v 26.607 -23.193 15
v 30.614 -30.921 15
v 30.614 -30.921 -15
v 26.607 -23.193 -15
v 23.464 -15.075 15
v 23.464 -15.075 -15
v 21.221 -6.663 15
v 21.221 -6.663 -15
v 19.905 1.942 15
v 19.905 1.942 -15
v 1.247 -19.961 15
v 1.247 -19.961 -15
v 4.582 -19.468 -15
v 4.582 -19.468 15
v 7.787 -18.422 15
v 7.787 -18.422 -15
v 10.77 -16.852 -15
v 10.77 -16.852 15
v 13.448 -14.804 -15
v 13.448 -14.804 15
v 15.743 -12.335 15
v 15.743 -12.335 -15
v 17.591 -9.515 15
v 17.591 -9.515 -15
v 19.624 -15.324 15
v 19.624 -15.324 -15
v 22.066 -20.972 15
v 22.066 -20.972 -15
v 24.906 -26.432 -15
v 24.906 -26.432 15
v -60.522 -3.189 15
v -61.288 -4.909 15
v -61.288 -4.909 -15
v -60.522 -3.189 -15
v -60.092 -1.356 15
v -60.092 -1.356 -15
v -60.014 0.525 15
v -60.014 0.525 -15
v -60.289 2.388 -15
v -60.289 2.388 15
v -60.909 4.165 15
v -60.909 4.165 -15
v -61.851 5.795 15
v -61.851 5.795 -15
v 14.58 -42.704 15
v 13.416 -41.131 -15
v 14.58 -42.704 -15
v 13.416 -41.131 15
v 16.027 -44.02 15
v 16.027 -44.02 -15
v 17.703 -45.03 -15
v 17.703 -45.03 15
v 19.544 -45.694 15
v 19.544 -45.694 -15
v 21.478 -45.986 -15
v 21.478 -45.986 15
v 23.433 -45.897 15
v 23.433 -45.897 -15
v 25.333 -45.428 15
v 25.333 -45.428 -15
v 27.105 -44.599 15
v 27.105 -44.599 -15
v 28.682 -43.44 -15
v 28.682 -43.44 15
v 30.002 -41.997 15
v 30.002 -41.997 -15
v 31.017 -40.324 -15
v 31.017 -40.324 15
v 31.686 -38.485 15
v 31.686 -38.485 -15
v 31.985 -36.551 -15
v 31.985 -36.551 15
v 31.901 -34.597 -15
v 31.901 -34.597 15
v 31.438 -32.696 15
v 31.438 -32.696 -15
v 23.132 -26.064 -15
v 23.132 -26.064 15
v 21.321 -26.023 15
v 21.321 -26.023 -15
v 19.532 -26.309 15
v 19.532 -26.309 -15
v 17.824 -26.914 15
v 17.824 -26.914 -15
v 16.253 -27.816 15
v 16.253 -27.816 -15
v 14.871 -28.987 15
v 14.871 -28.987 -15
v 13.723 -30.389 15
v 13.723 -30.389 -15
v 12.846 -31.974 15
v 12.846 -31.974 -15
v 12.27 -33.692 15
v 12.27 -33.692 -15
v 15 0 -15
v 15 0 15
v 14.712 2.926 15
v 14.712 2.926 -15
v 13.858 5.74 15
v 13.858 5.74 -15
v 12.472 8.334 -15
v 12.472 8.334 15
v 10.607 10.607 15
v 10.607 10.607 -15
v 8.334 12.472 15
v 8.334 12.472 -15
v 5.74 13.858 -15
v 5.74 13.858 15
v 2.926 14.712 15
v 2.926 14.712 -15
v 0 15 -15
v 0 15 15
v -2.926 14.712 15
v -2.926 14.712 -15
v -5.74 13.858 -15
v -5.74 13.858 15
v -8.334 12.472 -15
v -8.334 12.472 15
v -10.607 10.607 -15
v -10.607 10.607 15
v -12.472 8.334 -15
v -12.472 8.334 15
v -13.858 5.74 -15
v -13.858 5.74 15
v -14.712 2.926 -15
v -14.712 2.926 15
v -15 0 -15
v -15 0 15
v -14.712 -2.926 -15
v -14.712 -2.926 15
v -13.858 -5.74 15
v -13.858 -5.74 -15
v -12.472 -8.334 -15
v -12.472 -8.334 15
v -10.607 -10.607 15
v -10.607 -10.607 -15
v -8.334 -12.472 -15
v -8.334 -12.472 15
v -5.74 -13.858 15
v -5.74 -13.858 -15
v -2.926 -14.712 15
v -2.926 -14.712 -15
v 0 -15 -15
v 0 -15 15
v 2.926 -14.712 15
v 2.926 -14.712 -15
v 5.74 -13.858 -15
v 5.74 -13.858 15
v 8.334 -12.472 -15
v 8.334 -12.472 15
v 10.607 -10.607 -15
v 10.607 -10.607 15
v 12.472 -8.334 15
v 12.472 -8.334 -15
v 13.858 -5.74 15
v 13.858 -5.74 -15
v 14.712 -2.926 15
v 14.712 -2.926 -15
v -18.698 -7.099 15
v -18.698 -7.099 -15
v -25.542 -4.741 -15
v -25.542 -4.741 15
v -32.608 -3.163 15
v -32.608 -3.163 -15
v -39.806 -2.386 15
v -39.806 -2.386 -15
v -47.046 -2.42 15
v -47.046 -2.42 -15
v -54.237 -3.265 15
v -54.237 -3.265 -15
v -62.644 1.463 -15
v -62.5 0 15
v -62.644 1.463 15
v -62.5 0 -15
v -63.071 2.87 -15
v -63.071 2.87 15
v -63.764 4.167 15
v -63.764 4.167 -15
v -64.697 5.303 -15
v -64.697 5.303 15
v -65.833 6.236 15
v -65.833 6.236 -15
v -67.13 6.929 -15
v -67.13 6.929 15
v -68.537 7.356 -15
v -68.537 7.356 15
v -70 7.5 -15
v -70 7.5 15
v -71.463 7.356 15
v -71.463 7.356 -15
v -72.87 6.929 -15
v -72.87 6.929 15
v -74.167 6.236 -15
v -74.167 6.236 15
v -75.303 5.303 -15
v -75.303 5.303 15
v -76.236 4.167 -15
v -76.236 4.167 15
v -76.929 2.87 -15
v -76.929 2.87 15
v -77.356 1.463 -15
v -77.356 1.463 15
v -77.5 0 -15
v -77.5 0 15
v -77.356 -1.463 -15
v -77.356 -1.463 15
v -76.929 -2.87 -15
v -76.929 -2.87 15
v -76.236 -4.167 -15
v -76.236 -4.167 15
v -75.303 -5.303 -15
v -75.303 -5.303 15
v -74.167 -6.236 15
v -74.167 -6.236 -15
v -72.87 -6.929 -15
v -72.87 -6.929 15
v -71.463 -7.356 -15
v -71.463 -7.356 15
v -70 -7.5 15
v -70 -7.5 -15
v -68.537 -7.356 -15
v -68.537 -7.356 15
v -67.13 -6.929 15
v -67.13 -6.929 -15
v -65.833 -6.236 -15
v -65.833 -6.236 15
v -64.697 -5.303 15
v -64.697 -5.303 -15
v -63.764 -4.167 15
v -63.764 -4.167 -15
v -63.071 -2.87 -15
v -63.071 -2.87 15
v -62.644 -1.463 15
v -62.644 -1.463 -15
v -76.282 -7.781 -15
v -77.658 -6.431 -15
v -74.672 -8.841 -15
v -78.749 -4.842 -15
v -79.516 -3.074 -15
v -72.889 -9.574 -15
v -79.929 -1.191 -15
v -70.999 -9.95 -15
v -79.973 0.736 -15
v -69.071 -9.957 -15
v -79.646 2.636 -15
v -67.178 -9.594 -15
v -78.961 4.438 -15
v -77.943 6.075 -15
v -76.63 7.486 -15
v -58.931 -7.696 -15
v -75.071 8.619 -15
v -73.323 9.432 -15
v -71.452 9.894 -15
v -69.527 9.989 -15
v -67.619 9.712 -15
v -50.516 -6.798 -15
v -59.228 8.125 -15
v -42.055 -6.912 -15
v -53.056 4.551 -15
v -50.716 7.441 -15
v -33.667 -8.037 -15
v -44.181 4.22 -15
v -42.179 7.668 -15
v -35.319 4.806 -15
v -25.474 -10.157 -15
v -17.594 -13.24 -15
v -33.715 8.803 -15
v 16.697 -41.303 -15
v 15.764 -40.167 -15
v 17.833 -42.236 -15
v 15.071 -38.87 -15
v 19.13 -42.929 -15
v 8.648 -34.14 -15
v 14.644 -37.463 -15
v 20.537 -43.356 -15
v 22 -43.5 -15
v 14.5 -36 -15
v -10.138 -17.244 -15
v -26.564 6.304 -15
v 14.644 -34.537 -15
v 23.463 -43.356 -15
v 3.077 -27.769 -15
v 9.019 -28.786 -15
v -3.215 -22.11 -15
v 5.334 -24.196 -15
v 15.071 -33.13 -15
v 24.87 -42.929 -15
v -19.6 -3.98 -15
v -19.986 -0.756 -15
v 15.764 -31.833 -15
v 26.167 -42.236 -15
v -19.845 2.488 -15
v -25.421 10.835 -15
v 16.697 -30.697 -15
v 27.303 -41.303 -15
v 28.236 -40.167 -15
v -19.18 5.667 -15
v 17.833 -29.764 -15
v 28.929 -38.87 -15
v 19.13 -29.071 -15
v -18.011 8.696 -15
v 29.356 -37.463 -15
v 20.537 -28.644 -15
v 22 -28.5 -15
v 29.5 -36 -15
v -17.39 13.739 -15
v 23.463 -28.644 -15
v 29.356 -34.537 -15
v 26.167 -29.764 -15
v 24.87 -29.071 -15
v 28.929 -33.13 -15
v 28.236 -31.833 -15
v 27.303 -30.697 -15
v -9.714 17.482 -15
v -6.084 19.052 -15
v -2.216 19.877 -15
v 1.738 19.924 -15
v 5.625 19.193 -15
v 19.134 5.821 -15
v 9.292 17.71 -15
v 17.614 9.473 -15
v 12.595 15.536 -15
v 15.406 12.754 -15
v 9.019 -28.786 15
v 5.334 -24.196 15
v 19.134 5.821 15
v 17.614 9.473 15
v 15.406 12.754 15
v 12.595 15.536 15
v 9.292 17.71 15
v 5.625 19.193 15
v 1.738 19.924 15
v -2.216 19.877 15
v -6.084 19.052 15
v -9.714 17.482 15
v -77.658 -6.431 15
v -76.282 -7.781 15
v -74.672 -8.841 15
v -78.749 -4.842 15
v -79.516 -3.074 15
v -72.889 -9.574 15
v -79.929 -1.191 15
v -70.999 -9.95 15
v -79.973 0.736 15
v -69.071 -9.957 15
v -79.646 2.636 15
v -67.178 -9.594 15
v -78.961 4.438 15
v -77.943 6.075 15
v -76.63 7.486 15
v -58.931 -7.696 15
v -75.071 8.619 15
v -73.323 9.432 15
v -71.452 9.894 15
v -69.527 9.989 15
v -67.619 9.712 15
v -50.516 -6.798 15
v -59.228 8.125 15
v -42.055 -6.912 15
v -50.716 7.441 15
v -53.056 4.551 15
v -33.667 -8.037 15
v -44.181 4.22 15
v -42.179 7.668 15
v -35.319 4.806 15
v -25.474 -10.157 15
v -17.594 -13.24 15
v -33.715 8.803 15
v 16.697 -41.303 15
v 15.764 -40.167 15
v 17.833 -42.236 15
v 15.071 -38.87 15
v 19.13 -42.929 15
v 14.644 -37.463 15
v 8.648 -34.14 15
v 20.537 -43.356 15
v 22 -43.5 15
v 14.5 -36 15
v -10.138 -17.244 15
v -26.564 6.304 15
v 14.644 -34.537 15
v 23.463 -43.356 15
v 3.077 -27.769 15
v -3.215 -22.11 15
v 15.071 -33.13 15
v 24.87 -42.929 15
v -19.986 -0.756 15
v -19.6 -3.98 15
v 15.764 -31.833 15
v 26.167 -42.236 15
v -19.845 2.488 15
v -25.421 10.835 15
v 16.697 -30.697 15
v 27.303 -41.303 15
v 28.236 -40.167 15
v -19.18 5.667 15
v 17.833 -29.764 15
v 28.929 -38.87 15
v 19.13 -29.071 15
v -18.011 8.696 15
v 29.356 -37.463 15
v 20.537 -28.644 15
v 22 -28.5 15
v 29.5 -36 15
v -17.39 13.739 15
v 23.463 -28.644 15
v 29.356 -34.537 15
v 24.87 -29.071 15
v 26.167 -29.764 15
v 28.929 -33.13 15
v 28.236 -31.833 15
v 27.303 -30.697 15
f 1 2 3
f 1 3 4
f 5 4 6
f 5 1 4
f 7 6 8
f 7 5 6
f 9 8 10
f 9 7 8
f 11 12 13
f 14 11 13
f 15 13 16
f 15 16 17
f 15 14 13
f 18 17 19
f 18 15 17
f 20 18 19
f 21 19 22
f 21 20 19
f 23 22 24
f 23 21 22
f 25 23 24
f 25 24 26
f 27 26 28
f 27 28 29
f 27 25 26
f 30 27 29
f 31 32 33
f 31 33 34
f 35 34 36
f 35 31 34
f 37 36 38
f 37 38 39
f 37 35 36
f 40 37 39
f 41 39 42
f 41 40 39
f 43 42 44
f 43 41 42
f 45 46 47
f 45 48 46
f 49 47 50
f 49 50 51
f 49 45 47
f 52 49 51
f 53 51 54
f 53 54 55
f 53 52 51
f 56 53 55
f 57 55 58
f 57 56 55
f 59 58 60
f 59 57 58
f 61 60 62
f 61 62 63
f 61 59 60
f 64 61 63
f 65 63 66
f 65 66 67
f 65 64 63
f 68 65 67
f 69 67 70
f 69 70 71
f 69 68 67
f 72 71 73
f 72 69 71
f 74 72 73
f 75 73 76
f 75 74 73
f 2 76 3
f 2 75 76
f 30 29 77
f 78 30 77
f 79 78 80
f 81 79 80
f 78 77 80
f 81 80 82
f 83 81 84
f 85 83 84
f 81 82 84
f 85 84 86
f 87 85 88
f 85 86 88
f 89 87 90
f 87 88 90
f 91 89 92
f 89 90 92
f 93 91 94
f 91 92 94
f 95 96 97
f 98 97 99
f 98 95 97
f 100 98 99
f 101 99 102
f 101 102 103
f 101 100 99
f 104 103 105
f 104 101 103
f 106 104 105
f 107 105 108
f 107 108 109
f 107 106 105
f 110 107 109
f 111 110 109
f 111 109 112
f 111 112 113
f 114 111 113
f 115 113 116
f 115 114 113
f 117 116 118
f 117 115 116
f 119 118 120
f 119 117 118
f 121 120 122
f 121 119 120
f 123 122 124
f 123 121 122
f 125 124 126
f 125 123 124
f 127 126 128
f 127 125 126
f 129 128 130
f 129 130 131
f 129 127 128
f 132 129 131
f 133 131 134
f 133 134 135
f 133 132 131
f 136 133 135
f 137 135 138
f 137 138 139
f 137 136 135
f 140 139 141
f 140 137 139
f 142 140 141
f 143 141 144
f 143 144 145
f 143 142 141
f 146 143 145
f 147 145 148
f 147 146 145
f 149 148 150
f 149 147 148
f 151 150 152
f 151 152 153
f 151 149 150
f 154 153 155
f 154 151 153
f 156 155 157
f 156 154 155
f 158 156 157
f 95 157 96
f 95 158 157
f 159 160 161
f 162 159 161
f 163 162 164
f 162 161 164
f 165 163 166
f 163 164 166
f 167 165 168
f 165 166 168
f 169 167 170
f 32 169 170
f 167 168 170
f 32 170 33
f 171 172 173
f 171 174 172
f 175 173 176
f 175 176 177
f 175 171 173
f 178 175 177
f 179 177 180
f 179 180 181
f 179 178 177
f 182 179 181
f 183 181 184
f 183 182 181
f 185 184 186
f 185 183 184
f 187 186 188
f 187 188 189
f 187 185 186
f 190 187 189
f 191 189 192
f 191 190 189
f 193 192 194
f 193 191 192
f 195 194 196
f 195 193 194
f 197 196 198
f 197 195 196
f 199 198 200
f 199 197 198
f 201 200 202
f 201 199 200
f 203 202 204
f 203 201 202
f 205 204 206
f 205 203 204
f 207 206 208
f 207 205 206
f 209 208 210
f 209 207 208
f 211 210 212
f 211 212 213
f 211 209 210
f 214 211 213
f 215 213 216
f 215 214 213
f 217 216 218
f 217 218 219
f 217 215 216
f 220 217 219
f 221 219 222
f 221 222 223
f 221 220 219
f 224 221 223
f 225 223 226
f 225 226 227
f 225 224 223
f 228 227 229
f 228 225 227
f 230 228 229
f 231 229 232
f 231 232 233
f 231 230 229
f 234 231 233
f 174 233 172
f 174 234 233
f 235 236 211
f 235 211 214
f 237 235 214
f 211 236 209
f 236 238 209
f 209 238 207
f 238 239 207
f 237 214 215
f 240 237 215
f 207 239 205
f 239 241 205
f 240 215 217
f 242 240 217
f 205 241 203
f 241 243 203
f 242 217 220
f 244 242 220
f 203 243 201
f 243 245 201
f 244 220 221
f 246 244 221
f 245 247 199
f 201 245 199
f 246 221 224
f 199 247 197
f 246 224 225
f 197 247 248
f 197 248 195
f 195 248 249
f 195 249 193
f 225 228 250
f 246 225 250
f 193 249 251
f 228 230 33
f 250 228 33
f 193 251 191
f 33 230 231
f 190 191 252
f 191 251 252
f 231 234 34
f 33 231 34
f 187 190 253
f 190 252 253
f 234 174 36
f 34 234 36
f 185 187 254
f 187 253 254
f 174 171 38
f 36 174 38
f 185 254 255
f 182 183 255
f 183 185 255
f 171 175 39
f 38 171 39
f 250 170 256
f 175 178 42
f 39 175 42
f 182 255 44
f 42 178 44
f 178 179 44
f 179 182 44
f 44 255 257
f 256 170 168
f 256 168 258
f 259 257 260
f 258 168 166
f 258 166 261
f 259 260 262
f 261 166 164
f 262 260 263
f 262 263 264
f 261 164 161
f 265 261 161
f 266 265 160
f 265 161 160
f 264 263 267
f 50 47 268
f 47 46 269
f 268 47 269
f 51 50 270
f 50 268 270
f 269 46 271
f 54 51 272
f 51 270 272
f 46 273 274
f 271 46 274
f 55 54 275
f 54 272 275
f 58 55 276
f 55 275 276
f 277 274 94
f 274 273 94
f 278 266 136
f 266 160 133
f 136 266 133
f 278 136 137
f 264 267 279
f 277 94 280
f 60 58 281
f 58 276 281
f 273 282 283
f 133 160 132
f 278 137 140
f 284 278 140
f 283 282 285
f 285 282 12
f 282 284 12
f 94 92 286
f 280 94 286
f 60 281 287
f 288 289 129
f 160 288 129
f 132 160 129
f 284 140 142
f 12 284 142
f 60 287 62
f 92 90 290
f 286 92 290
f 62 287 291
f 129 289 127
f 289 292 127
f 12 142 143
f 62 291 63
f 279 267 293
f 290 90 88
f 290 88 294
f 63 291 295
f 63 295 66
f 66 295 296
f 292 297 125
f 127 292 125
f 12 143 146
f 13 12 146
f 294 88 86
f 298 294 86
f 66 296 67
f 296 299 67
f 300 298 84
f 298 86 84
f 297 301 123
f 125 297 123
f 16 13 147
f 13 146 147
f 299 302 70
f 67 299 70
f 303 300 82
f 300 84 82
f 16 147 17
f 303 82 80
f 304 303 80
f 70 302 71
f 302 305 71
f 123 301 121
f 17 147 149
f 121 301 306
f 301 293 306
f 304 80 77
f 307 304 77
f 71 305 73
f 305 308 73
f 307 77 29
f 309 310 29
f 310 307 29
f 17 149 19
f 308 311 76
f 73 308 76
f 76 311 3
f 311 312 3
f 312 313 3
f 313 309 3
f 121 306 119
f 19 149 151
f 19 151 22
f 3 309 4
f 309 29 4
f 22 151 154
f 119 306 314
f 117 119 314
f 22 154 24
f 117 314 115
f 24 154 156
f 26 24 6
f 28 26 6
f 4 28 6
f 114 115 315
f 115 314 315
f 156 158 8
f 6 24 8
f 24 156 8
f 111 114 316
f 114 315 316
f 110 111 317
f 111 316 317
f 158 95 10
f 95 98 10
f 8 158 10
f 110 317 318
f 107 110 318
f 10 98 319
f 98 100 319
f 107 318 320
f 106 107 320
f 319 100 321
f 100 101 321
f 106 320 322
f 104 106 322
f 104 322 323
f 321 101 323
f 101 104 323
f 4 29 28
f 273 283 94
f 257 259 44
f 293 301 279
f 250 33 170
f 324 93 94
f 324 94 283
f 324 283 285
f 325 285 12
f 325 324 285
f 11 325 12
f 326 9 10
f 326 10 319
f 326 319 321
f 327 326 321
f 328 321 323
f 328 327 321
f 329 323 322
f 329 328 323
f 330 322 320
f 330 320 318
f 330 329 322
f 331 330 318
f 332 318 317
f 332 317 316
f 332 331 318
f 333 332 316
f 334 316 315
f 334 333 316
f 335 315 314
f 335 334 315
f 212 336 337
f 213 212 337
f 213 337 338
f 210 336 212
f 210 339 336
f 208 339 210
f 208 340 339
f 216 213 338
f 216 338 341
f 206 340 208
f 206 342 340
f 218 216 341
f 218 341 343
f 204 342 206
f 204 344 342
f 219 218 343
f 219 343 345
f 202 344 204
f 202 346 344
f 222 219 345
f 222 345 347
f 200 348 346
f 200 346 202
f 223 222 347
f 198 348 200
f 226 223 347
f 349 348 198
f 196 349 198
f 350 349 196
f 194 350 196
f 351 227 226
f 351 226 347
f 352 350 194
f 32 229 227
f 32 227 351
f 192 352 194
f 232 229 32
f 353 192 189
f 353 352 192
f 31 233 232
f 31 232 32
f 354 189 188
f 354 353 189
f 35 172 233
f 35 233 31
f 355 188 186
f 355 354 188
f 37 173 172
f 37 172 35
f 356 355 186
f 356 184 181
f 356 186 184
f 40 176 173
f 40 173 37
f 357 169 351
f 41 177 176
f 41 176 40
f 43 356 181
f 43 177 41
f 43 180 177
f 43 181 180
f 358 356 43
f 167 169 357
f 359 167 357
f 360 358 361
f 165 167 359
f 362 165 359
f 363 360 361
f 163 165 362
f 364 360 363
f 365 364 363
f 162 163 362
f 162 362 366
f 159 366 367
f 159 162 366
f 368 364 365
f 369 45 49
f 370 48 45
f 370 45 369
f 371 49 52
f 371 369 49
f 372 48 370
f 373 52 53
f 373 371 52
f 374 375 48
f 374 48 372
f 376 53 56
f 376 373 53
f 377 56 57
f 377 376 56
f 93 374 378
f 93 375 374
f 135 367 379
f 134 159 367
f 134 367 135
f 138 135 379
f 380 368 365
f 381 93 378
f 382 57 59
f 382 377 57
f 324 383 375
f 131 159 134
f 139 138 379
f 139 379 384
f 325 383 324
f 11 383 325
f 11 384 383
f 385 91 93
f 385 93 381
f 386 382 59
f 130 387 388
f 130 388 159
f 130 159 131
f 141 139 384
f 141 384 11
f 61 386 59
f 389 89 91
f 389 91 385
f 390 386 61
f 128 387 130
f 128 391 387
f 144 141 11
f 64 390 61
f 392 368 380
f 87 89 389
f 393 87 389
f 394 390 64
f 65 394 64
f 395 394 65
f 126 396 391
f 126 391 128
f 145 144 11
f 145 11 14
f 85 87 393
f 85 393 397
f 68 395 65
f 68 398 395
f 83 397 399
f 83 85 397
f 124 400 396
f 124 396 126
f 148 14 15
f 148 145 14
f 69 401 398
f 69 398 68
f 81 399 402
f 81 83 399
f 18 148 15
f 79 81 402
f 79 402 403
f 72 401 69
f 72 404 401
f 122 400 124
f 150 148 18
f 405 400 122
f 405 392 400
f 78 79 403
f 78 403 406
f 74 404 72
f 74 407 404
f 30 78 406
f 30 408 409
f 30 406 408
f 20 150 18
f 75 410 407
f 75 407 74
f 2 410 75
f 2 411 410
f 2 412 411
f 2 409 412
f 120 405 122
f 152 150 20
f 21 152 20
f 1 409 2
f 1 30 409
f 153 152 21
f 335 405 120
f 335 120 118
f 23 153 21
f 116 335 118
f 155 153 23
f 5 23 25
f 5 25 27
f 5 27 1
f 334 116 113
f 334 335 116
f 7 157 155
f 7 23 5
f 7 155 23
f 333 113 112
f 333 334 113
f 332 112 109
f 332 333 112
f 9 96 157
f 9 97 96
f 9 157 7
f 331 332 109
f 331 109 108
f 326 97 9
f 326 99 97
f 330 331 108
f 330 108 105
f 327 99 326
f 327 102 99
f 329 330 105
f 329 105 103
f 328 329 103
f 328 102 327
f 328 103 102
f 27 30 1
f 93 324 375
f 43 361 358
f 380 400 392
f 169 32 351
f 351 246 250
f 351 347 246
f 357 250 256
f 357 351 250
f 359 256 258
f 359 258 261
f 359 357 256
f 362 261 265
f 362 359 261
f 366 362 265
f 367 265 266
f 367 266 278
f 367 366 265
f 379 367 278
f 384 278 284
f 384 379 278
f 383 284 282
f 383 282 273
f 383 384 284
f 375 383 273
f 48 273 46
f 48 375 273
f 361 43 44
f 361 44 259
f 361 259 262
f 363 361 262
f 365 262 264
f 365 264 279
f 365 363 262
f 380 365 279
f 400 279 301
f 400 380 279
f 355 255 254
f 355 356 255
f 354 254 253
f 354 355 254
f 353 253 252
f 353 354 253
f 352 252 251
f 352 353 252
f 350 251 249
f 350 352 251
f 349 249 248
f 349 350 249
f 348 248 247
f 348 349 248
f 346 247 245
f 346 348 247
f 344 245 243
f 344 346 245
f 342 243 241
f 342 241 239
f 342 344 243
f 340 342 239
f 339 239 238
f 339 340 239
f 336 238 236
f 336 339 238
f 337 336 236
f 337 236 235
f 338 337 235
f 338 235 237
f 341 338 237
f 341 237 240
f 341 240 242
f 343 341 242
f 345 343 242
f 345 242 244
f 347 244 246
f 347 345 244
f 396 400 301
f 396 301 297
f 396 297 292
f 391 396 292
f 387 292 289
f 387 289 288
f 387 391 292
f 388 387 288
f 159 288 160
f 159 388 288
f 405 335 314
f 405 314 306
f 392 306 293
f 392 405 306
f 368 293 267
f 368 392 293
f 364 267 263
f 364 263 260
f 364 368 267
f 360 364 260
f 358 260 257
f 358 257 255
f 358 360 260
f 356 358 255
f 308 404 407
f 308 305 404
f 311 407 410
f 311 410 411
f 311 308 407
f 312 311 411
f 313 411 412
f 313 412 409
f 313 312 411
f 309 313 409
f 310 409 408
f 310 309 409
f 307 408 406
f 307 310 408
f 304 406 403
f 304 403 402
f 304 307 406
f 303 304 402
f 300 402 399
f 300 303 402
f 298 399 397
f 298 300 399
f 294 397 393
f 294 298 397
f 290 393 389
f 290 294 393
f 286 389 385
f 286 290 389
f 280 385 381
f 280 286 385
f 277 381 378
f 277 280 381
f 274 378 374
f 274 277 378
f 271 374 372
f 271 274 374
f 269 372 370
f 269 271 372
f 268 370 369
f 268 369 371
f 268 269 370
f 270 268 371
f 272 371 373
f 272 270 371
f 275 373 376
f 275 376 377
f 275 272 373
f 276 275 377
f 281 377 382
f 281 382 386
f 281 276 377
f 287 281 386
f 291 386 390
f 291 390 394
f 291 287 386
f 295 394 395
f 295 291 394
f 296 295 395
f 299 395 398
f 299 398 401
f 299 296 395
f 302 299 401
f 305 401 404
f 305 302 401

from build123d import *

# Parameters (mm, degrees)
SKETCH1_R           = 7.5
SKETCH1_R_2         = 15
BOSS_EXTRUDE1_DEPTH = 15


with BuildPart() as part:
    # Sketch1 → Boss-Extrude1 (new, symmetric)
    with BuildSketch(Plane.XY):
        with BuildLine():
            ThreePointArc((13.416465379, -41.130588018), (27.104825758, -44.598880973), (30.614150003, -30.920982406))
            ThreePointArc((30.614150003, -30.920982406), (23.463789692, -15.074619609), (19.905470006, 1.94223167))
            ThreePointArc((19.905470006, 1.94223167), (9.291872744, 17.710479974), (-9.714285714, 17.482352618))
            ThreePointArc((-9.714285714, 17.482352618), (-37.932007586, 8.122402385), (-67.619047619, 9.712418121))
            ThreePointArc((-67.619047619, 9.712418121), (-79.997392689, -0.228340587), (-67.178098245, -9.593584861))
            ThreePointArc((-67.178098245, -9.593584861), (-21.487956439, -11.580333122), (13.416465379, -41.130588018))
        make_face()
        with BuildLine():
            ThreePointArc((-18.010602512, 8.695872422), (-19.981112924, 0.868980041), (-18.697541465, -7.099432594))
            ThreePointArc((-18.697541465, -7.099432594), (-39.80648554, -2.386385888), (-61.287612025, -4.908594074))
            ThreePointArc((-61.287612025, -4.908594074), (-60.013800827, 0.525191469), (-61.850552891, 5.795387115))
            ThreePointArc((-61.850552891, 5.795387115), (-39.742227949, 4.398780735), (-18.010602512, 8.695872422))
        make_face(mode=Mode.SUBTRACT)
        with Locations((22, -36)):
            Circle(SKETCH1_R, mode=Mode.SUBTRACT)
        with BuildLine():
            ThreePointArc((17.591425152, -9.515343459), (20.794474813, -18.170038976), (24.906454326, -26.431691725))
            ThreePointArc((24.906454326, -26.431691725), (17.018206606, -27.32925986), (12.26998728, -33.692002498))
            ThreePointArc((12.26998728, -33.692002498), (7.22870194, -26.449040107), (1.246931193, -19.961091218))
            ThreePointArc((1.246931193, -19.961091218), (10.770298464, -16.852319454), (17.591425152, -9.515343459))
        make_face(mode=Mode.SUBTRACT)
        with Locations((-70, 0)):
            Circle(SKETCH1_R, mode=Mode.SUBTRACT)
        Circle(SKETCH1_R_2, mode=Mode.SUBTRACT)
    extrude(amount=BOSS_EXTRUDE1_DEPTH, both=True)


solid = part.part
